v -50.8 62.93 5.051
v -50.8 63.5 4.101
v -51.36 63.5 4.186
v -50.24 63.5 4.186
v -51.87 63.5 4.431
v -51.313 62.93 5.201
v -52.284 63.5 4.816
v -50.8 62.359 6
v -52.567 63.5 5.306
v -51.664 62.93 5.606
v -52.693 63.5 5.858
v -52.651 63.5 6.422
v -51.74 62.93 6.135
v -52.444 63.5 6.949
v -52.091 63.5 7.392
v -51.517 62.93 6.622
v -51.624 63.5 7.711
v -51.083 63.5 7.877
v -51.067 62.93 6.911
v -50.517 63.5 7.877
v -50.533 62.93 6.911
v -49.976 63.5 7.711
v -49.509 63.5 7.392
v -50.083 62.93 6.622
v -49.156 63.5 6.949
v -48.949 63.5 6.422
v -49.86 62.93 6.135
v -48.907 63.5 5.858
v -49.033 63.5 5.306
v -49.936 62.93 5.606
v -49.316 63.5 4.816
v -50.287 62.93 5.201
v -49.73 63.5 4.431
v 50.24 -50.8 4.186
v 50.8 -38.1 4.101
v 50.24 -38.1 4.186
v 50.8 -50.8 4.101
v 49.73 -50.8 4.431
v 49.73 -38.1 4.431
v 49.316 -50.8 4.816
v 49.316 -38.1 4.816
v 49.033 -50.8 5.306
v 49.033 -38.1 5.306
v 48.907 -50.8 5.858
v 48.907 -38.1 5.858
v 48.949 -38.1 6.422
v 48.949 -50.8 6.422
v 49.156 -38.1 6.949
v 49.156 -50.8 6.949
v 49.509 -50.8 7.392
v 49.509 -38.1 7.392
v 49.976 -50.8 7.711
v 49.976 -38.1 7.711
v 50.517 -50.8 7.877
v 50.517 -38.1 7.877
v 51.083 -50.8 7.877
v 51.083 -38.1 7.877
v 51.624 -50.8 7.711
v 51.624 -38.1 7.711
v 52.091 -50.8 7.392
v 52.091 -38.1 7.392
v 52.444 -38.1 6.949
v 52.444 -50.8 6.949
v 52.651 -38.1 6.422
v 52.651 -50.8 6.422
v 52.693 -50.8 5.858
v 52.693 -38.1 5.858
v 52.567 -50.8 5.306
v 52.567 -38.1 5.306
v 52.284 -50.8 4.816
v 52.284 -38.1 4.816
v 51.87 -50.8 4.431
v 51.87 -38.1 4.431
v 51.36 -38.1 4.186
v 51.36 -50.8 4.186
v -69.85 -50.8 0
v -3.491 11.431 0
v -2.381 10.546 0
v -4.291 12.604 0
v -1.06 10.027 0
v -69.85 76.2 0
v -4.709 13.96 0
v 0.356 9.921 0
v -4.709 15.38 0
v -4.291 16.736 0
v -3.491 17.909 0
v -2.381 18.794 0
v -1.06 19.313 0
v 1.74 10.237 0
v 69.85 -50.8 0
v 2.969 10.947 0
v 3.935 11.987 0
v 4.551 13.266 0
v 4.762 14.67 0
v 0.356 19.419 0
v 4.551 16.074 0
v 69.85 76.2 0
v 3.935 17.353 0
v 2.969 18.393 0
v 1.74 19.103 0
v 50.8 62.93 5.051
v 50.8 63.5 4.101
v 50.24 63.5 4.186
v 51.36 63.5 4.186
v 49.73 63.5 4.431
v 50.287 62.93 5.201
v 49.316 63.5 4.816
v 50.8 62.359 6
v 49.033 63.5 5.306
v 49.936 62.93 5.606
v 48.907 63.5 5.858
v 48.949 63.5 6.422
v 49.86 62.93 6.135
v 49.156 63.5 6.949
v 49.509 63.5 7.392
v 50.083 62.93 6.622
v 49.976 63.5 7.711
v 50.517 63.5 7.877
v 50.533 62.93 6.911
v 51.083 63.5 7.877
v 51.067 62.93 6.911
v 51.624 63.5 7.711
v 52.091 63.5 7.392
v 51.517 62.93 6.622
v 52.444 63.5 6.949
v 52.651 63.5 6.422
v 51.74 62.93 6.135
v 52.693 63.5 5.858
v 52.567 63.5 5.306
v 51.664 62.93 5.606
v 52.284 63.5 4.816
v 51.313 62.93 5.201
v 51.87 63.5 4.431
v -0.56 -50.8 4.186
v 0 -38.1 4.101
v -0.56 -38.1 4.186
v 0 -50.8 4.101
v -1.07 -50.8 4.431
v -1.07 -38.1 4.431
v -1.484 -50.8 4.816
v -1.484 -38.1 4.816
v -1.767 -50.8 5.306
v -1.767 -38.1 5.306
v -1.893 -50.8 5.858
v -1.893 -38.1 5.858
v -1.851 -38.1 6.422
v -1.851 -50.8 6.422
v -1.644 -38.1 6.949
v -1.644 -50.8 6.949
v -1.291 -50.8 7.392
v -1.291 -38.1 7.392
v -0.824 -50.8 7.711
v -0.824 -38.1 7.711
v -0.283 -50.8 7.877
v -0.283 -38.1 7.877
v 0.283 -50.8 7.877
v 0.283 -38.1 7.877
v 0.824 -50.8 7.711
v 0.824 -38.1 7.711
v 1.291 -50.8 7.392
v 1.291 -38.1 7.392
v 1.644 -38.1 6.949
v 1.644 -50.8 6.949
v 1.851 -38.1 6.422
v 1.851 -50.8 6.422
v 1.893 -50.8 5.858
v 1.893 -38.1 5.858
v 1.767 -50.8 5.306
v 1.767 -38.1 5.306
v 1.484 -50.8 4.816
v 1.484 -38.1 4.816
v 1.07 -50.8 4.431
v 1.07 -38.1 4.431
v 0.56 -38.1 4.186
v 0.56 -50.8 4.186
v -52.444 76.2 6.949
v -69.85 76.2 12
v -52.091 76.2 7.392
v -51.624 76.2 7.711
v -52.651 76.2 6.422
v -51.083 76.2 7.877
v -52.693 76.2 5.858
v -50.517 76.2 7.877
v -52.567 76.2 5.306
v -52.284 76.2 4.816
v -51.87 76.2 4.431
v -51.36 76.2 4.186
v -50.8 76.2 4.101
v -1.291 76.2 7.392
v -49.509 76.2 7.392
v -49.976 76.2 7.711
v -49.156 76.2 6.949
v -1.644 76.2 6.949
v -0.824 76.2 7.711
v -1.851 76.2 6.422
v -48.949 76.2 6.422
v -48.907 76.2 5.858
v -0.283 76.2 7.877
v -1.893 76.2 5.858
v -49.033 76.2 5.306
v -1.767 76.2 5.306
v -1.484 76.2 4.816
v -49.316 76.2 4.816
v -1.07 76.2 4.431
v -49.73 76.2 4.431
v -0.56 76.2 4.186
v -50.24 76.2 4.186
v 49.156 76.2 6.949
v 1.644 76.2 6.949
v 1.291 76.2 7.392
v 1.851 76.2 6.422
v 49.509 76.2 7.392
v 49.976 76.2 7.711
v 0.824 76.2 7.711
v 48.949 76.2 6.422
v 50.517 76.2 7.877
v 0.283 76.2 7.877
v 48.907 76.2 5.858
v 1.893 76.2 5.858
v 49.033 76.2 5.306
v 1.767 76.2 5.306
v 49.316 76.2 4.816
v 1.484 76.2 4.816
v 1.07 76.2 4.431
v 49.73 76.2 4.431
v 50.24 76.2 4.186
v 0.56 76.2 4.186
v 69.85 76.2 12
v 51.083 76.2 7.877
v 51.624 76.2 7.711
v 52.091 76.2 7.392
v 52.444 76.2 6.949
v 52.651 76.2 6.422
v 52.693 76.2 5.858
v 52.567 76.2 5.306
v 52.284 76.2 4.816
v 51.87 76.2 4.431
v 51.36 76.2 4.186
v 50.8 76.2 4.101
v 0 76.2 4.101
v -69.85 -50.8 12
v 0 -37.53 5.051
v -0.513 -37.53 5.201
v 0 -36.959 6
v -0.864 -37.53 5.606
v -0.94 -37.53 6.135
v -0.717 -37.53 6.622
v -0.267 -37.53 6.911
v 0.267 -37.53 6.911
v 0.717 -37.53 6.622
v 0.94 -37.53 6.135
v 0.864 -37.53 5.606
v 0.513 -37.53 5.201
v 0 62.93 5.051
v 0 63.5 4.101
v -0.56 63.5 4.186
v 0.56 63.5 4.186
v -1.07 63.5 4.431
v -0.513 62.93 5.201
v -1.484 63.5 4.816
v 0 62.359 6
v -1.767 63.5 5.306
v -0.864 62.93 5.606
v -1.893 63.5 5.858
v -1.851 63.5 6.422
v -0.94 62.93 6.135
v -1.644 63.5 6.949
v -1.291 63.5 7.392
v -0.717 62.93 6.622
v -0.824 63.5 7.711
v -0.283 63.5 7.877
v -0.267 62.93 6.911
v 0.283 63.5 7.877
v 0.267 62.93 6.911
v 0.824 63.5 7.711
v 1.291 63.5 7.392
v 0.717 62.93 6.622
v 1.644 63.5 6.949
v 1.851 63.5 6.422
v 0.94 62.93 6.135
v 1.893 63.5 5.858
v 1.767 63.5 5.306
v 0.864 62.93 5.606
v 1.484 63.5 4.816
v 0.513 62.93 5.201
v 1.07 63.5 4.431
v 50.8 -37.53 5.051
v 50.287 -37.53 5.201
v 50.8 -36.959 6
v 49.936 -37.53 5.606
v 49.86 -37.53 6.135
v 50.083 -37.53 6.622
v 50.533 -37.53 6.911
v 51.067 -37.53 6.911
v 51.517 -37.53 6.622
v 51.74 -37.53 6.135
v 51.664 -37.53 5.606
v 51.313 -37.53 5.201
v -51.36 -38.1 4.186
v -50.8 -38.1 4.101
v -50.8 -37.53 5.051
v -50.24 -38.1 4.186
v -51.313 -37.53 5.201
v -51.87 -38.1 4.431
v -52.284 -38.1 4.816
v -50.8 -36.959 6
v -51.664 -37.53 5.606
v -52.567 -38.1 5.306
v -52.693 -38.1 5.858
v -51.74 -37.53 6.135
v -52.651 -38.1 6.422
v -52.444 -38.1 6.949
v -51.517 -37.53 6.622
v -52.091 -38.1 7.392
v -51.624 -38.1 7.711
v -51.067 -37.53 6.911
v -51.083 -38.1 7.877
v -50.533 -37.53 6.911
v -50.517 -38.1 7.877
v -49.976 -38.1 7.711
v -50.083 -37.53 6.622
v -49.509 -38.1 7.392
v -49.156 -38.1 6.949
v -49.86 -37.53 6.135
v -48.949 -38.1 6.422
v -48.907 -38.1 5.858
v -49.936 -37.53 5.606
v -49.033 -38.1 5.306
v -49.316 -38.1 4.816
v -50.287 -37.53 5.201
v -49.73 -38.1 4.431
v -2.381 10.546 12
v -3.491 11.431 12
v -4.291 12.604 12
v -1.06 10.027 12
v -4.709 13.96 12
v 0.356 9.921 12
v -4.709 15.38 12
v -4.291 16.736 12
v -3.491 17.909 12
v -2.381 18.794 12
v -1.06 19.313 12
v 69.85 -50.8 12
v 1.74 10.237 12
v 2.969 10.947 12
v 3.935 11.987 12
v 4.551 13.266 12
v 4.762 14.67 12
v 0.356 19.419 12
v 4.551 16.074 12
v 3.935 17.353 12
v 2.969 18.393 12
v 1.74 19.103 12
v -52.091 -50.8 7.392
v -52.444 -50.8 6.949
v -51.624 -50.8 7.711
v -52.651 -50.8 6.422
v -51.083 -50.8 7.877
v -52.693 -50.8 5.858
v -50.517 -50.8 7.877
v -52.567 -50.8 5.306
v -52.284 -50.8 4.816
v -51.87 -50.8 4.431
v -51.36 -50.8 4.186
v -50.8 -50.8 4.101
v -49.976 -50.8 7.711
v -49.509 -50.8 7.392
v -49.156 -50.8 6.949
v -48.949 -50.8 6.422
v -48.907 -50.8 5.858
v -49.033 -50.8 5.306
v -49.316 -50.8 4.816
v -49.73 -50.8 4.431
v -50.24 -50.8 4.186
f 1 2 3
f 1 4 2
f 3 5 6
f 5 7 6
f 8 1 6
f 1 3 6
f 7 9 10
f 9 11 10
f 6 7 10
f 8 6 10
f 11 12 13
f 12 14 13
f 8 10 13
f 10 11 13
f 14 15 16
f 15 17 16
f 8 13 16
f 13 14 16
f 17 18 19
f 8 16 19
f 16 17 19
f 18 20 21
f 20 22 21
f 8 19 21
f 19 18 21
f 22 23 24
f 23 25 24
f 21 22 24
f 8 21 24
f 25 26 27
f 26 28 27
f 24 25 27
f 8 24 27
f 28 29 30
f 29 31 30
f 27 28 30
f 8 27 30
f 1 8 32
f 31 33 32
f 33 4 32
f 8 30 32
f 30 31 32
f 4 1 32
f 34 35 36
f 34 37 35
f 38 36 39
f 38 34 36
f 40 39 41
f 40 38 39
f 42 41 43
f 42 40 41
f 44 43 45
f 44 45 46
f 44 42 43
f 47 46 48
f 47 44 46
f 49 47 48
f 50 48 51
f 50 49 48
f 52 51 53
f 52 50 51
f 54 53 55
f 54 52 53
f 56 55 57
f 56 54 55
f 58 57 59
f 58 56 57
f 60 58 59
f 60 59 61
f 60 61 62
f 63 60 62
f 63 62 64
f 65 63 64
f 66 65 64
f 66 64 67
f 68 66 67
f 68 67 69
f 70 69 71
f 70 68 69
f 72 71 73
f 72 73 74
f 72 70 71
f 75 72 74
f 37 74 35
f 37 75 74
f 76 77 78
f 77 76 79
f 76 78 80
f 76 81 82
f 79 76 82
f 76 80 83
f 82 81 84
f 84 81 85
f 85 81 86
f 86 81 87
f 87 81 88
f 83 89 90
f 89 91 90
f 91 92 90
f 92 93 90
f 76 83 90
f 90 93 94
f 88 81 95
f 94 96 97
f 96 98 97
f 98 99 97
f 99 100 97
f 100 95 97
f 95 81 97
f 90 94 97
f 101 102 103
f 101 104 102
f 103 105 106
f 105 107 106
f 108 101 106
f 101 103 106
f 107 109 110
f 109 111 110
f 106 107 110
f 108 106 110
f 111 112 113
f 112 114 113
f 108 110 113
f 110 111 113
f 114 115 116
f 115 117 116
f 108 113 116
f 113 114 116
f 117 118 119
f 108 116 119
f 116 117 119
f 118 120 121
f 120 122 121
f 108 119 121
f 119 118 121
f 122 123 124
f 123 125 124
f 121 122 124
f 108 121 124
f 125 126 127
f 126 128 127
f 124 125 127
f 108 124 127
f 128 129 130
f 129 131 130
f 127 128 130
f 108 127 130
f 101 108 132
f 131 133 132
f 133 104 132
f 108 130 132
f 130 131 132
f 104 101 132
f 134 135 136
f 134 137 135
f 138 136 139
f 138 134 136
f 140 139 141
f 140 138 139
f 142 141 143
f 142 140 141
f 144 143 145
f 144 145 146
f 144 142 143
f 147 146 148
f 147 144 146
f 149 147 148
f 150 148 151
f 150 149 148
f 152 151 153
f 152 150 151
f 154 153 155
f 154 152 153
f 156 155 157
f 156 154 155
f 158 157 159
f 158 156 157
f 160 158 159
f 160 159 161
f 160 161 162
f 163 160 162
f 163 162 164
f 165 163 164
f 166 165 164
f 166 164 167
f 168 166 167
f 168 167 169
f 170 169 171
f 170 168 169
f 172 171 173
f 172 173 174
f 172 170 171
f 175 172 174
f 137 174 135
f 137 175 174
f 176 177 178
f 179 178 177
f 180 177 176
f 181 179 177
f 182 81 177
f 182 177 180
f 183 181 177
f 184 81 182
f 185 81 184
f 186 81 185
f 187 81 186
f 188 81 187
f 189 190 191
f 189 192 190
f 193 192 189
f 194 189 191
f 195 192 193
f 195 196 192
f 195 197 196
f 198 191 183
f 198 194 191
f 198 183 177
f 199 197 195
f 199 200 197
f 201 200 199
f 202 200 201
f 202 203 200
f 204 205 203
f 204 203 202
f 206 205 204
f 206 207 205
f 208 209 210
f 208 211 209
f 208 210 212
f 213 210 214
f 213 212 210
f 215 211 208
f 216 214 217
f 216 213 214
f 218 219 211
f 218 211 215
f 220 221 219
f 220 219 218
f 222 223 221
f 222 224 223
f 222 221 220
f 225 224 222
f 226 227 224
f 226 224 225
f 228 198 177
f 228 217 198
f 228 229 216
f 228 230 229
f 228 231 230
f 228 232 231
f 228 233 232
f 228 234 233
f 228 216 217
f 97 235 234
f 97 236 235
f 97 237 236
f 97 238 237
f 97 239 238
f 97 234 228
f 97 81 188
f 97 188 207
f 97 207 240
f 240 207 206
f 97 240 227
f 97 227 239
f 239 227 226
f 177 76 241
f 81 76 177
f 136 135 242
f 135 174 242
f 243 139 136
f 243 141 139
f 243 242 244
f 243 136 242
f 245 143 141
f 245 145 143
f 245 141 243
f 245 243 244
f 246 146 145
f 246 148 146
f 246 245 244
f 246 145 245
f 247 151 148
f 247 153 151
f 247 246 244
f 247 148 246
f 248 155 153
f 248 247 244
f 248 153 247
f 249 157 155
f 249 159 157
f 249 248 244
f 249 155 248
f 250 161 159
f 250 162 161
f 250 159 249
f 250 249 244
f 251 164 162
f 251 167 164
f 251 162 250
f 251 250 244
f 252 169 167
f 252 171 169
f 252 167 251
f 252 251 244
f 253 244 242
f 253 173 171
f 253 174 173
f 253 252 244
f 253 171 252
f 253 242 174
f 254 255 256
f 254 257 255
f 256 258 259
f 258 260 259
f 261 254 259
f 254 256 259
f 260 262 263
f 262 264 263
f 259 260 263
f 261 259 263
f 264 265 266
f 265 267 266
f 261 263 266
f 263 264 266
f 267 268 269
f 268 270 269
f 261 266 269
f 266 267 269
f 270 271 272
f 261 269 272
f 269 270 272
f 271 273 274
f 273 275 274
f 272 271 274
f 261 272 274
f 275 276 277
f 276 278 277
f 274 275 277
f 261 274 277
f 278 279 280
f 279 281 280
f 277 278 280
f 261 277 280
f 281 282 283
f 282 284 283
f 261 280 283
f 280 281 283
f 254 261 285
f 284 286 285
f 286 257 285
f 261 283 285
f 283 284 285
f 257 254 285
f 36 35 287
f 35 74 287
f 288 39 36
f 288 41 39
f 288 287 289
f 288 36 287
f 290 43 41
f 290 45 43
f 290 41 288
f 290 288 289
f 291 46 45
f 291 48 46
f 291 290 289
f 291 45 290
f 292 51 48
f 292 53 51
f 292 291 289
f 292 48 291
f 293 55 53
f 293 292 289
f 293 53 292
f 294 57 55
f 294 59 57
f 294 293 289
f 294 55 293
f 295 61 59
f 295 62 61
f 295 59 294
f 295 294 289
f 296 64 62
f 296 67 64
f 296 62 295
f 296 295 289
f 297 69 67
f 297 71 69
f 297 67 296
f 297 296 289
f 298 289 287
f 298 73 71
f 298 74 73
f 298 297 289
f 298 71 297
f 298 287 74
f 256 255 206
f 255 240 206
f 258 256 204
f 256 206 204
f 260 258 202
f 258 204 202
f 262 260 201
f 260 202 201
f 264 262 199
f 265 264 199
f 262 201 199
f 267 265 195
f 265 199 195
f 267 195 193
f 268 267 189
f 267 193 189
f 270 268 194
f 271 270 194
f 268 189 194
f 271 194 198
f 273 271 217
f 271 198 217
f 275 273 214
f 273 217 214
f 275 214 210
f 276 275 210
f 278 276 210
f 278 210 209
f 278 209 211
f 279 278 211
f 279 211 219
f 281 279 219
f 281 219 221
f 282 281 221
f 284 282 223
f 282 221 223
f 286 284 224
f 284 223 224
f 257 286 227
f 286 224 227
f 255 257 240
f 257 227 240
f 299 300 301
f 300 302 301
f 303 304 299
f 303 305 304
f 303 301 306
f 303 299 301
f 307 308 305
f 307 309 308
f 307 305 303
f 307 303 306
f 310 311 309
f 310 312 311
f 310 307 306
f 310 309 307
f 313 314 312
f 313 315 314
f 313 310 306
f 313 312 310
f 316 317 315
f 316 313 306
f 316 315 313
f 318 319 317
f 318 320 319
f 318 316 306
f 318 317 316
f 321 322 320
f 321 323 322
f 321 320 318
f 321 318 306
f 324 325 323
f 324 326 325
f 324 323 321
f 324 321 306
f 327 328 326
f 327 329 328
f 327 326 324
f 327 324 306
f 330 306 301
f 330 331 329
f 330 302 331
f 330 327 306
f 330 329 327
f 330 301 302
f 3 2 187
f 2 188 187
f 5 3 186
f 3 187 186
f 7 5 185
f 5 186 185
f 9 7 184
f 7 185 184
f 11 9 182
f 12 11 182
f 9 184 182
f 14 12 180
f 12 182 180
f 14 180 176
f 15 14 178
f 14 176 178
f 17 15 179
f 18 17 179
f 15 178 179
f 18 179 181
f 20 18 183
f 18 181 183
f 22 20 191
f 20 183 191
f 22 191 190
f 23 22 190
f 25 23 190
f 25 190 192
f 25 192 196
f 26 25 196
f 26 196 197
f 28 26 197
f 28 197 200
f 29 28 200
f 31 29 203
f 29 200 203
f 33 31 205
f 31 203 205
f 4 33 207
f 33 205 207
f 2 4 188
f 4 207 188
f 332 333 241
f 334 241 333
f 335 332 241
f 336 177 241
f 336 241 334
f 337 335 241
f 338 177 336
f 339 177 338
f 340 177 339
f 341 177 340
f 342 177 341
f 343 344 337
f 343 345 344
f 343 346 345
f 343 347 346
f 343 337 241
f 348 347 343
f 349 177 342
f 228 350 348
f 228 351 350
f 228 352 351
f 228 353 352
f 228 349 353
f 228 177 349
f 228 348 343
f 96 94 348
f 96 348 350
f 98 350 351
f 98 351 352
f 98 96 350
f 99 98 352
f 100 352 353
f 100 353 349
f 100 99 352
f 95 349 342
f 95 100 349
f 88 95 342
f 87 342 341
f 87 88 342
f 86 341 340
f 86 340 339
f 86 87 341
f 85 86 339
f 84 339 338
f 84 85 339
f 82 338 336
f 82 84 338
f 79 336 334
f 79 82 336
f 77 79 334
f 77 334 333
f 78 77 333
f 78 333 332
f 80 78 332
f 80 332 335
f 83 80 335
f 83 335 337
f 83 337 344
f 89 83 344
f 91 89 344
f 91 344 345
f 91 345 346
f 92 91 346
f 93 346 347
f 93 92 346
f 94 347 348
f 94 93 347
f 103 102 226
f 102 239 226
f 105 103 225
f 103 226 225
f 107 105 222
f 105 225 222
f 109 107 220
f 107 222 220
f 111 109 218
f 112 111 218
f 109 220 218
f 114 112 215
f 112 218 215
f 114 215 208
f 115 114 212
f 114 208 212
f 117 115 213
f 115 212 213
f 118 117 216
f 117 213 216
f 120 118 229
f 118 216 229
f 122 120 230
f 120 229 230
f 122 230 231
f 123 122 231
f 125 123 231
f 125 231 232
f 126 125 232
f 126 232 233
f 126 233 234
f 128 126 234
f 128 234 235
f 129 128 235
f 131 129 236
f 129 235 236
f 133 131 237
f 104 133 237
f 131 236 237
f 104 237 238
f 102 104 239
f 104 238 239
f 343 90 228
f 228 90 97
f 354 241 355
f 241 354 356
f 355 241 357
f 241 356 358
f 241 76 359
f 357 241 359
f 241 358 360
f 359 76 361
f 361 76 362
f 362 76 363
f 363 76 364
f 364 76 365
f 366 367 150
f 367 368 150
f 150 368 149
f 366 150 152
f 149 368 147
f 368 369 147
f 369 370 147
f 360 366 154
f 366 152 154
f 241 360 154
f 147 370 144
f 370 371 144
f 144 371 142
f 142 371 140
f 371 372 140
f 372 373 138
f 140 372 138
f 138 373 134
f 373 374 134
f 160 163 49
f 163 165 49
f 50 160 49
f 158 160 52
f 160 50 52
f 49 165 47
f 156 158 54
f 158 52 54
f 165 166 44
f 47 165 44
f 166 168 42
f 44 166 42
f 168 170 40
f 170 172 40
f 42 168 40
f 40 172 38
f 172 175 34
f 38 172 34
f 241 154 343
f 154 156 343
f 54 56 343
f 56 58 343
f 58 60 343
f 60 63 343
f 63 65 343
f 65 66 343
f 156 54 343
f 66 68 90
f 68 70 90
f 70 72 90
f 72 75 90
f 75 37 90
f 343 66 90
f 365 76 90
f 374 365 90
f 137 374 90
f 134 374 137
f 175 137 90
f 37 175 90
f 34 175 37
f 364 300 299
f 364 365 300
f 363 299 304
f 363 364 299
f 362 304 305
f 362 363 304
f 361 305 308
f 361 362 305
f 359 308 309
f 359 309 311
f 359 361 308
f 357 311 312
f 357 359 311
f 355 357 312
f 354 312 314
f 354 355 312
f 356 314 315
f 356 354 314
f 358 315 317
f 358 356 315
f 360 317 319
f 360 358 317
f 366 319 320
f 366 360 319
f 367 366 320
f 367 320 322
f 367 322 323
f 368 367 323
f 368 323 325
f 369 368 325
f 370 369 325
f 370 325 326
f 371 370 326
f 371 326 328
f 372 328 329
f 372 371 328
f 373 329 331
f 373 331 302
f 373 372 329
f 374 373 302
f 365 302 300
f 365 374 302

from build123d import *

# Parameters (mm, degrees)
SKETCH1_W                           = 139.7
SKETCH1_H                           = 127
SKETCH1_R                           = 4.7625
BOSS_EXTRUDE1_DEPTH                 = 12
TAP_DRILL_FOR_10_24_TAP1_AT_2_COUNT = 2
TAP_DRILL_FOR_10_24_TAP1_AT_2_PITCH = 50.8
TAP_DRILL_FOR_10_24_TAP1_AT_3_COUNT = 2
TAP_DRILL_FOR_10_24_TAP1_AT_3_PITCH = 101.6


with BuildPart() as part:
    # Sketch1 → Boss-Extrude1 (new body)
    with BuildSketch(Plane.XY):
        with Locations((0, 12.7)):
            Rectangle(SKETCH1_W, SKETCH1_H)
        with Locations((0, 14.67)):
            Circle(SKETCH1_R, mode=Mode.SUBTRACT)
    extrude(amount=BOSS_EXTRUDE1_DEPTH)

    # Sketch4 → Tap Drill for #10-24 Tap1 (revolve, cut)
    with BuildSketch(Plane(origin=(50.8, -50.8, 6), x_dir=(0, 0, -1), z_dir=(1, 0, 0))):
        Polygon((0, 0), (0, 13.840824014), (1.89865, 12.7), (1.89865, 0), align=None)
    tap_drill_for_10_24_tap1 = revolve(axis=Axis((50.8, -57.15, 6), (0, 1, 0)), mode=Mode.SUBTRACT)

    # Tap Drill for #10-24 Tap1 at 2: Tap Drill for #10-24 Tap1 ×2
    with Locations(*[(-i * TAP_DRILL_FOR_10_24_TAP1_AT_2_PITCH, 0, 0) for i in range(1, TAP_DRILL_FOR_10_24_TAP1_AT_2_COUNT)]):
        add(tap_drill_for_10_24_tap1, mode=Mode.SUBTRACT)

    # Tap Drill for #10-24 Tap1 at 3: Tap Drill for #10-24 Tap1 ×2
    with Locations(*[(-i * TAP_DRILL_FOR_10_24_TAP1_AT_3_PITCH, 0, 0) for i in range(1, TAP_DRILL_FOR_10_24_TAP1_AT_3_COUNT)]):
        add(tap_drill_for_10_24_tap1, mode=Mode.SUBTRACT)

    # Mirror1: Tap Drill for #10-24 Tap1 across plane
    add(tap_drill_for_10_24_tap1.mirror(Plane(origin=(0, 12.7, 0), x_dir=(0, 0, 1), z_dir=(0, -1, 0))), mode=Mode.SUBTRACT)

    # Mirror1 copy 1 sketch → Mirror1 copy 1 (revolve, cut)
    with BuildSketch(Plane(origin=(0, 76.2, 6), x_dir=(0, 0, -1), z_dir=(1, 0, 0))):
        Polygon((0, 0), (0, -13.840824014), (1.89865, -12.7), (1.89865, 0), align=None)
    revolve(axis=Axis((0, 82.55, 6), (0, 1, 0)), mode=Mode.SUBTRACT)

    # Mirror1 copy 2 sketch → Mirror1 copy 2 (revolve, cut)
    with BuildSketch(Plane(origin=(-50.8, 76.2, 6), x_dir=(0, 0, -1), z_dir=(1, 0, 0))):
        Polygon((0, 0), (0, -13.840824014), (1.89865, -12.7), (1.89865, 0), align=None)
    revolve(axis=Axis((-50.8, 82.55, 6), (0, 1, 0)), mode=Mode.SUBTRACT)


solid = part.part
